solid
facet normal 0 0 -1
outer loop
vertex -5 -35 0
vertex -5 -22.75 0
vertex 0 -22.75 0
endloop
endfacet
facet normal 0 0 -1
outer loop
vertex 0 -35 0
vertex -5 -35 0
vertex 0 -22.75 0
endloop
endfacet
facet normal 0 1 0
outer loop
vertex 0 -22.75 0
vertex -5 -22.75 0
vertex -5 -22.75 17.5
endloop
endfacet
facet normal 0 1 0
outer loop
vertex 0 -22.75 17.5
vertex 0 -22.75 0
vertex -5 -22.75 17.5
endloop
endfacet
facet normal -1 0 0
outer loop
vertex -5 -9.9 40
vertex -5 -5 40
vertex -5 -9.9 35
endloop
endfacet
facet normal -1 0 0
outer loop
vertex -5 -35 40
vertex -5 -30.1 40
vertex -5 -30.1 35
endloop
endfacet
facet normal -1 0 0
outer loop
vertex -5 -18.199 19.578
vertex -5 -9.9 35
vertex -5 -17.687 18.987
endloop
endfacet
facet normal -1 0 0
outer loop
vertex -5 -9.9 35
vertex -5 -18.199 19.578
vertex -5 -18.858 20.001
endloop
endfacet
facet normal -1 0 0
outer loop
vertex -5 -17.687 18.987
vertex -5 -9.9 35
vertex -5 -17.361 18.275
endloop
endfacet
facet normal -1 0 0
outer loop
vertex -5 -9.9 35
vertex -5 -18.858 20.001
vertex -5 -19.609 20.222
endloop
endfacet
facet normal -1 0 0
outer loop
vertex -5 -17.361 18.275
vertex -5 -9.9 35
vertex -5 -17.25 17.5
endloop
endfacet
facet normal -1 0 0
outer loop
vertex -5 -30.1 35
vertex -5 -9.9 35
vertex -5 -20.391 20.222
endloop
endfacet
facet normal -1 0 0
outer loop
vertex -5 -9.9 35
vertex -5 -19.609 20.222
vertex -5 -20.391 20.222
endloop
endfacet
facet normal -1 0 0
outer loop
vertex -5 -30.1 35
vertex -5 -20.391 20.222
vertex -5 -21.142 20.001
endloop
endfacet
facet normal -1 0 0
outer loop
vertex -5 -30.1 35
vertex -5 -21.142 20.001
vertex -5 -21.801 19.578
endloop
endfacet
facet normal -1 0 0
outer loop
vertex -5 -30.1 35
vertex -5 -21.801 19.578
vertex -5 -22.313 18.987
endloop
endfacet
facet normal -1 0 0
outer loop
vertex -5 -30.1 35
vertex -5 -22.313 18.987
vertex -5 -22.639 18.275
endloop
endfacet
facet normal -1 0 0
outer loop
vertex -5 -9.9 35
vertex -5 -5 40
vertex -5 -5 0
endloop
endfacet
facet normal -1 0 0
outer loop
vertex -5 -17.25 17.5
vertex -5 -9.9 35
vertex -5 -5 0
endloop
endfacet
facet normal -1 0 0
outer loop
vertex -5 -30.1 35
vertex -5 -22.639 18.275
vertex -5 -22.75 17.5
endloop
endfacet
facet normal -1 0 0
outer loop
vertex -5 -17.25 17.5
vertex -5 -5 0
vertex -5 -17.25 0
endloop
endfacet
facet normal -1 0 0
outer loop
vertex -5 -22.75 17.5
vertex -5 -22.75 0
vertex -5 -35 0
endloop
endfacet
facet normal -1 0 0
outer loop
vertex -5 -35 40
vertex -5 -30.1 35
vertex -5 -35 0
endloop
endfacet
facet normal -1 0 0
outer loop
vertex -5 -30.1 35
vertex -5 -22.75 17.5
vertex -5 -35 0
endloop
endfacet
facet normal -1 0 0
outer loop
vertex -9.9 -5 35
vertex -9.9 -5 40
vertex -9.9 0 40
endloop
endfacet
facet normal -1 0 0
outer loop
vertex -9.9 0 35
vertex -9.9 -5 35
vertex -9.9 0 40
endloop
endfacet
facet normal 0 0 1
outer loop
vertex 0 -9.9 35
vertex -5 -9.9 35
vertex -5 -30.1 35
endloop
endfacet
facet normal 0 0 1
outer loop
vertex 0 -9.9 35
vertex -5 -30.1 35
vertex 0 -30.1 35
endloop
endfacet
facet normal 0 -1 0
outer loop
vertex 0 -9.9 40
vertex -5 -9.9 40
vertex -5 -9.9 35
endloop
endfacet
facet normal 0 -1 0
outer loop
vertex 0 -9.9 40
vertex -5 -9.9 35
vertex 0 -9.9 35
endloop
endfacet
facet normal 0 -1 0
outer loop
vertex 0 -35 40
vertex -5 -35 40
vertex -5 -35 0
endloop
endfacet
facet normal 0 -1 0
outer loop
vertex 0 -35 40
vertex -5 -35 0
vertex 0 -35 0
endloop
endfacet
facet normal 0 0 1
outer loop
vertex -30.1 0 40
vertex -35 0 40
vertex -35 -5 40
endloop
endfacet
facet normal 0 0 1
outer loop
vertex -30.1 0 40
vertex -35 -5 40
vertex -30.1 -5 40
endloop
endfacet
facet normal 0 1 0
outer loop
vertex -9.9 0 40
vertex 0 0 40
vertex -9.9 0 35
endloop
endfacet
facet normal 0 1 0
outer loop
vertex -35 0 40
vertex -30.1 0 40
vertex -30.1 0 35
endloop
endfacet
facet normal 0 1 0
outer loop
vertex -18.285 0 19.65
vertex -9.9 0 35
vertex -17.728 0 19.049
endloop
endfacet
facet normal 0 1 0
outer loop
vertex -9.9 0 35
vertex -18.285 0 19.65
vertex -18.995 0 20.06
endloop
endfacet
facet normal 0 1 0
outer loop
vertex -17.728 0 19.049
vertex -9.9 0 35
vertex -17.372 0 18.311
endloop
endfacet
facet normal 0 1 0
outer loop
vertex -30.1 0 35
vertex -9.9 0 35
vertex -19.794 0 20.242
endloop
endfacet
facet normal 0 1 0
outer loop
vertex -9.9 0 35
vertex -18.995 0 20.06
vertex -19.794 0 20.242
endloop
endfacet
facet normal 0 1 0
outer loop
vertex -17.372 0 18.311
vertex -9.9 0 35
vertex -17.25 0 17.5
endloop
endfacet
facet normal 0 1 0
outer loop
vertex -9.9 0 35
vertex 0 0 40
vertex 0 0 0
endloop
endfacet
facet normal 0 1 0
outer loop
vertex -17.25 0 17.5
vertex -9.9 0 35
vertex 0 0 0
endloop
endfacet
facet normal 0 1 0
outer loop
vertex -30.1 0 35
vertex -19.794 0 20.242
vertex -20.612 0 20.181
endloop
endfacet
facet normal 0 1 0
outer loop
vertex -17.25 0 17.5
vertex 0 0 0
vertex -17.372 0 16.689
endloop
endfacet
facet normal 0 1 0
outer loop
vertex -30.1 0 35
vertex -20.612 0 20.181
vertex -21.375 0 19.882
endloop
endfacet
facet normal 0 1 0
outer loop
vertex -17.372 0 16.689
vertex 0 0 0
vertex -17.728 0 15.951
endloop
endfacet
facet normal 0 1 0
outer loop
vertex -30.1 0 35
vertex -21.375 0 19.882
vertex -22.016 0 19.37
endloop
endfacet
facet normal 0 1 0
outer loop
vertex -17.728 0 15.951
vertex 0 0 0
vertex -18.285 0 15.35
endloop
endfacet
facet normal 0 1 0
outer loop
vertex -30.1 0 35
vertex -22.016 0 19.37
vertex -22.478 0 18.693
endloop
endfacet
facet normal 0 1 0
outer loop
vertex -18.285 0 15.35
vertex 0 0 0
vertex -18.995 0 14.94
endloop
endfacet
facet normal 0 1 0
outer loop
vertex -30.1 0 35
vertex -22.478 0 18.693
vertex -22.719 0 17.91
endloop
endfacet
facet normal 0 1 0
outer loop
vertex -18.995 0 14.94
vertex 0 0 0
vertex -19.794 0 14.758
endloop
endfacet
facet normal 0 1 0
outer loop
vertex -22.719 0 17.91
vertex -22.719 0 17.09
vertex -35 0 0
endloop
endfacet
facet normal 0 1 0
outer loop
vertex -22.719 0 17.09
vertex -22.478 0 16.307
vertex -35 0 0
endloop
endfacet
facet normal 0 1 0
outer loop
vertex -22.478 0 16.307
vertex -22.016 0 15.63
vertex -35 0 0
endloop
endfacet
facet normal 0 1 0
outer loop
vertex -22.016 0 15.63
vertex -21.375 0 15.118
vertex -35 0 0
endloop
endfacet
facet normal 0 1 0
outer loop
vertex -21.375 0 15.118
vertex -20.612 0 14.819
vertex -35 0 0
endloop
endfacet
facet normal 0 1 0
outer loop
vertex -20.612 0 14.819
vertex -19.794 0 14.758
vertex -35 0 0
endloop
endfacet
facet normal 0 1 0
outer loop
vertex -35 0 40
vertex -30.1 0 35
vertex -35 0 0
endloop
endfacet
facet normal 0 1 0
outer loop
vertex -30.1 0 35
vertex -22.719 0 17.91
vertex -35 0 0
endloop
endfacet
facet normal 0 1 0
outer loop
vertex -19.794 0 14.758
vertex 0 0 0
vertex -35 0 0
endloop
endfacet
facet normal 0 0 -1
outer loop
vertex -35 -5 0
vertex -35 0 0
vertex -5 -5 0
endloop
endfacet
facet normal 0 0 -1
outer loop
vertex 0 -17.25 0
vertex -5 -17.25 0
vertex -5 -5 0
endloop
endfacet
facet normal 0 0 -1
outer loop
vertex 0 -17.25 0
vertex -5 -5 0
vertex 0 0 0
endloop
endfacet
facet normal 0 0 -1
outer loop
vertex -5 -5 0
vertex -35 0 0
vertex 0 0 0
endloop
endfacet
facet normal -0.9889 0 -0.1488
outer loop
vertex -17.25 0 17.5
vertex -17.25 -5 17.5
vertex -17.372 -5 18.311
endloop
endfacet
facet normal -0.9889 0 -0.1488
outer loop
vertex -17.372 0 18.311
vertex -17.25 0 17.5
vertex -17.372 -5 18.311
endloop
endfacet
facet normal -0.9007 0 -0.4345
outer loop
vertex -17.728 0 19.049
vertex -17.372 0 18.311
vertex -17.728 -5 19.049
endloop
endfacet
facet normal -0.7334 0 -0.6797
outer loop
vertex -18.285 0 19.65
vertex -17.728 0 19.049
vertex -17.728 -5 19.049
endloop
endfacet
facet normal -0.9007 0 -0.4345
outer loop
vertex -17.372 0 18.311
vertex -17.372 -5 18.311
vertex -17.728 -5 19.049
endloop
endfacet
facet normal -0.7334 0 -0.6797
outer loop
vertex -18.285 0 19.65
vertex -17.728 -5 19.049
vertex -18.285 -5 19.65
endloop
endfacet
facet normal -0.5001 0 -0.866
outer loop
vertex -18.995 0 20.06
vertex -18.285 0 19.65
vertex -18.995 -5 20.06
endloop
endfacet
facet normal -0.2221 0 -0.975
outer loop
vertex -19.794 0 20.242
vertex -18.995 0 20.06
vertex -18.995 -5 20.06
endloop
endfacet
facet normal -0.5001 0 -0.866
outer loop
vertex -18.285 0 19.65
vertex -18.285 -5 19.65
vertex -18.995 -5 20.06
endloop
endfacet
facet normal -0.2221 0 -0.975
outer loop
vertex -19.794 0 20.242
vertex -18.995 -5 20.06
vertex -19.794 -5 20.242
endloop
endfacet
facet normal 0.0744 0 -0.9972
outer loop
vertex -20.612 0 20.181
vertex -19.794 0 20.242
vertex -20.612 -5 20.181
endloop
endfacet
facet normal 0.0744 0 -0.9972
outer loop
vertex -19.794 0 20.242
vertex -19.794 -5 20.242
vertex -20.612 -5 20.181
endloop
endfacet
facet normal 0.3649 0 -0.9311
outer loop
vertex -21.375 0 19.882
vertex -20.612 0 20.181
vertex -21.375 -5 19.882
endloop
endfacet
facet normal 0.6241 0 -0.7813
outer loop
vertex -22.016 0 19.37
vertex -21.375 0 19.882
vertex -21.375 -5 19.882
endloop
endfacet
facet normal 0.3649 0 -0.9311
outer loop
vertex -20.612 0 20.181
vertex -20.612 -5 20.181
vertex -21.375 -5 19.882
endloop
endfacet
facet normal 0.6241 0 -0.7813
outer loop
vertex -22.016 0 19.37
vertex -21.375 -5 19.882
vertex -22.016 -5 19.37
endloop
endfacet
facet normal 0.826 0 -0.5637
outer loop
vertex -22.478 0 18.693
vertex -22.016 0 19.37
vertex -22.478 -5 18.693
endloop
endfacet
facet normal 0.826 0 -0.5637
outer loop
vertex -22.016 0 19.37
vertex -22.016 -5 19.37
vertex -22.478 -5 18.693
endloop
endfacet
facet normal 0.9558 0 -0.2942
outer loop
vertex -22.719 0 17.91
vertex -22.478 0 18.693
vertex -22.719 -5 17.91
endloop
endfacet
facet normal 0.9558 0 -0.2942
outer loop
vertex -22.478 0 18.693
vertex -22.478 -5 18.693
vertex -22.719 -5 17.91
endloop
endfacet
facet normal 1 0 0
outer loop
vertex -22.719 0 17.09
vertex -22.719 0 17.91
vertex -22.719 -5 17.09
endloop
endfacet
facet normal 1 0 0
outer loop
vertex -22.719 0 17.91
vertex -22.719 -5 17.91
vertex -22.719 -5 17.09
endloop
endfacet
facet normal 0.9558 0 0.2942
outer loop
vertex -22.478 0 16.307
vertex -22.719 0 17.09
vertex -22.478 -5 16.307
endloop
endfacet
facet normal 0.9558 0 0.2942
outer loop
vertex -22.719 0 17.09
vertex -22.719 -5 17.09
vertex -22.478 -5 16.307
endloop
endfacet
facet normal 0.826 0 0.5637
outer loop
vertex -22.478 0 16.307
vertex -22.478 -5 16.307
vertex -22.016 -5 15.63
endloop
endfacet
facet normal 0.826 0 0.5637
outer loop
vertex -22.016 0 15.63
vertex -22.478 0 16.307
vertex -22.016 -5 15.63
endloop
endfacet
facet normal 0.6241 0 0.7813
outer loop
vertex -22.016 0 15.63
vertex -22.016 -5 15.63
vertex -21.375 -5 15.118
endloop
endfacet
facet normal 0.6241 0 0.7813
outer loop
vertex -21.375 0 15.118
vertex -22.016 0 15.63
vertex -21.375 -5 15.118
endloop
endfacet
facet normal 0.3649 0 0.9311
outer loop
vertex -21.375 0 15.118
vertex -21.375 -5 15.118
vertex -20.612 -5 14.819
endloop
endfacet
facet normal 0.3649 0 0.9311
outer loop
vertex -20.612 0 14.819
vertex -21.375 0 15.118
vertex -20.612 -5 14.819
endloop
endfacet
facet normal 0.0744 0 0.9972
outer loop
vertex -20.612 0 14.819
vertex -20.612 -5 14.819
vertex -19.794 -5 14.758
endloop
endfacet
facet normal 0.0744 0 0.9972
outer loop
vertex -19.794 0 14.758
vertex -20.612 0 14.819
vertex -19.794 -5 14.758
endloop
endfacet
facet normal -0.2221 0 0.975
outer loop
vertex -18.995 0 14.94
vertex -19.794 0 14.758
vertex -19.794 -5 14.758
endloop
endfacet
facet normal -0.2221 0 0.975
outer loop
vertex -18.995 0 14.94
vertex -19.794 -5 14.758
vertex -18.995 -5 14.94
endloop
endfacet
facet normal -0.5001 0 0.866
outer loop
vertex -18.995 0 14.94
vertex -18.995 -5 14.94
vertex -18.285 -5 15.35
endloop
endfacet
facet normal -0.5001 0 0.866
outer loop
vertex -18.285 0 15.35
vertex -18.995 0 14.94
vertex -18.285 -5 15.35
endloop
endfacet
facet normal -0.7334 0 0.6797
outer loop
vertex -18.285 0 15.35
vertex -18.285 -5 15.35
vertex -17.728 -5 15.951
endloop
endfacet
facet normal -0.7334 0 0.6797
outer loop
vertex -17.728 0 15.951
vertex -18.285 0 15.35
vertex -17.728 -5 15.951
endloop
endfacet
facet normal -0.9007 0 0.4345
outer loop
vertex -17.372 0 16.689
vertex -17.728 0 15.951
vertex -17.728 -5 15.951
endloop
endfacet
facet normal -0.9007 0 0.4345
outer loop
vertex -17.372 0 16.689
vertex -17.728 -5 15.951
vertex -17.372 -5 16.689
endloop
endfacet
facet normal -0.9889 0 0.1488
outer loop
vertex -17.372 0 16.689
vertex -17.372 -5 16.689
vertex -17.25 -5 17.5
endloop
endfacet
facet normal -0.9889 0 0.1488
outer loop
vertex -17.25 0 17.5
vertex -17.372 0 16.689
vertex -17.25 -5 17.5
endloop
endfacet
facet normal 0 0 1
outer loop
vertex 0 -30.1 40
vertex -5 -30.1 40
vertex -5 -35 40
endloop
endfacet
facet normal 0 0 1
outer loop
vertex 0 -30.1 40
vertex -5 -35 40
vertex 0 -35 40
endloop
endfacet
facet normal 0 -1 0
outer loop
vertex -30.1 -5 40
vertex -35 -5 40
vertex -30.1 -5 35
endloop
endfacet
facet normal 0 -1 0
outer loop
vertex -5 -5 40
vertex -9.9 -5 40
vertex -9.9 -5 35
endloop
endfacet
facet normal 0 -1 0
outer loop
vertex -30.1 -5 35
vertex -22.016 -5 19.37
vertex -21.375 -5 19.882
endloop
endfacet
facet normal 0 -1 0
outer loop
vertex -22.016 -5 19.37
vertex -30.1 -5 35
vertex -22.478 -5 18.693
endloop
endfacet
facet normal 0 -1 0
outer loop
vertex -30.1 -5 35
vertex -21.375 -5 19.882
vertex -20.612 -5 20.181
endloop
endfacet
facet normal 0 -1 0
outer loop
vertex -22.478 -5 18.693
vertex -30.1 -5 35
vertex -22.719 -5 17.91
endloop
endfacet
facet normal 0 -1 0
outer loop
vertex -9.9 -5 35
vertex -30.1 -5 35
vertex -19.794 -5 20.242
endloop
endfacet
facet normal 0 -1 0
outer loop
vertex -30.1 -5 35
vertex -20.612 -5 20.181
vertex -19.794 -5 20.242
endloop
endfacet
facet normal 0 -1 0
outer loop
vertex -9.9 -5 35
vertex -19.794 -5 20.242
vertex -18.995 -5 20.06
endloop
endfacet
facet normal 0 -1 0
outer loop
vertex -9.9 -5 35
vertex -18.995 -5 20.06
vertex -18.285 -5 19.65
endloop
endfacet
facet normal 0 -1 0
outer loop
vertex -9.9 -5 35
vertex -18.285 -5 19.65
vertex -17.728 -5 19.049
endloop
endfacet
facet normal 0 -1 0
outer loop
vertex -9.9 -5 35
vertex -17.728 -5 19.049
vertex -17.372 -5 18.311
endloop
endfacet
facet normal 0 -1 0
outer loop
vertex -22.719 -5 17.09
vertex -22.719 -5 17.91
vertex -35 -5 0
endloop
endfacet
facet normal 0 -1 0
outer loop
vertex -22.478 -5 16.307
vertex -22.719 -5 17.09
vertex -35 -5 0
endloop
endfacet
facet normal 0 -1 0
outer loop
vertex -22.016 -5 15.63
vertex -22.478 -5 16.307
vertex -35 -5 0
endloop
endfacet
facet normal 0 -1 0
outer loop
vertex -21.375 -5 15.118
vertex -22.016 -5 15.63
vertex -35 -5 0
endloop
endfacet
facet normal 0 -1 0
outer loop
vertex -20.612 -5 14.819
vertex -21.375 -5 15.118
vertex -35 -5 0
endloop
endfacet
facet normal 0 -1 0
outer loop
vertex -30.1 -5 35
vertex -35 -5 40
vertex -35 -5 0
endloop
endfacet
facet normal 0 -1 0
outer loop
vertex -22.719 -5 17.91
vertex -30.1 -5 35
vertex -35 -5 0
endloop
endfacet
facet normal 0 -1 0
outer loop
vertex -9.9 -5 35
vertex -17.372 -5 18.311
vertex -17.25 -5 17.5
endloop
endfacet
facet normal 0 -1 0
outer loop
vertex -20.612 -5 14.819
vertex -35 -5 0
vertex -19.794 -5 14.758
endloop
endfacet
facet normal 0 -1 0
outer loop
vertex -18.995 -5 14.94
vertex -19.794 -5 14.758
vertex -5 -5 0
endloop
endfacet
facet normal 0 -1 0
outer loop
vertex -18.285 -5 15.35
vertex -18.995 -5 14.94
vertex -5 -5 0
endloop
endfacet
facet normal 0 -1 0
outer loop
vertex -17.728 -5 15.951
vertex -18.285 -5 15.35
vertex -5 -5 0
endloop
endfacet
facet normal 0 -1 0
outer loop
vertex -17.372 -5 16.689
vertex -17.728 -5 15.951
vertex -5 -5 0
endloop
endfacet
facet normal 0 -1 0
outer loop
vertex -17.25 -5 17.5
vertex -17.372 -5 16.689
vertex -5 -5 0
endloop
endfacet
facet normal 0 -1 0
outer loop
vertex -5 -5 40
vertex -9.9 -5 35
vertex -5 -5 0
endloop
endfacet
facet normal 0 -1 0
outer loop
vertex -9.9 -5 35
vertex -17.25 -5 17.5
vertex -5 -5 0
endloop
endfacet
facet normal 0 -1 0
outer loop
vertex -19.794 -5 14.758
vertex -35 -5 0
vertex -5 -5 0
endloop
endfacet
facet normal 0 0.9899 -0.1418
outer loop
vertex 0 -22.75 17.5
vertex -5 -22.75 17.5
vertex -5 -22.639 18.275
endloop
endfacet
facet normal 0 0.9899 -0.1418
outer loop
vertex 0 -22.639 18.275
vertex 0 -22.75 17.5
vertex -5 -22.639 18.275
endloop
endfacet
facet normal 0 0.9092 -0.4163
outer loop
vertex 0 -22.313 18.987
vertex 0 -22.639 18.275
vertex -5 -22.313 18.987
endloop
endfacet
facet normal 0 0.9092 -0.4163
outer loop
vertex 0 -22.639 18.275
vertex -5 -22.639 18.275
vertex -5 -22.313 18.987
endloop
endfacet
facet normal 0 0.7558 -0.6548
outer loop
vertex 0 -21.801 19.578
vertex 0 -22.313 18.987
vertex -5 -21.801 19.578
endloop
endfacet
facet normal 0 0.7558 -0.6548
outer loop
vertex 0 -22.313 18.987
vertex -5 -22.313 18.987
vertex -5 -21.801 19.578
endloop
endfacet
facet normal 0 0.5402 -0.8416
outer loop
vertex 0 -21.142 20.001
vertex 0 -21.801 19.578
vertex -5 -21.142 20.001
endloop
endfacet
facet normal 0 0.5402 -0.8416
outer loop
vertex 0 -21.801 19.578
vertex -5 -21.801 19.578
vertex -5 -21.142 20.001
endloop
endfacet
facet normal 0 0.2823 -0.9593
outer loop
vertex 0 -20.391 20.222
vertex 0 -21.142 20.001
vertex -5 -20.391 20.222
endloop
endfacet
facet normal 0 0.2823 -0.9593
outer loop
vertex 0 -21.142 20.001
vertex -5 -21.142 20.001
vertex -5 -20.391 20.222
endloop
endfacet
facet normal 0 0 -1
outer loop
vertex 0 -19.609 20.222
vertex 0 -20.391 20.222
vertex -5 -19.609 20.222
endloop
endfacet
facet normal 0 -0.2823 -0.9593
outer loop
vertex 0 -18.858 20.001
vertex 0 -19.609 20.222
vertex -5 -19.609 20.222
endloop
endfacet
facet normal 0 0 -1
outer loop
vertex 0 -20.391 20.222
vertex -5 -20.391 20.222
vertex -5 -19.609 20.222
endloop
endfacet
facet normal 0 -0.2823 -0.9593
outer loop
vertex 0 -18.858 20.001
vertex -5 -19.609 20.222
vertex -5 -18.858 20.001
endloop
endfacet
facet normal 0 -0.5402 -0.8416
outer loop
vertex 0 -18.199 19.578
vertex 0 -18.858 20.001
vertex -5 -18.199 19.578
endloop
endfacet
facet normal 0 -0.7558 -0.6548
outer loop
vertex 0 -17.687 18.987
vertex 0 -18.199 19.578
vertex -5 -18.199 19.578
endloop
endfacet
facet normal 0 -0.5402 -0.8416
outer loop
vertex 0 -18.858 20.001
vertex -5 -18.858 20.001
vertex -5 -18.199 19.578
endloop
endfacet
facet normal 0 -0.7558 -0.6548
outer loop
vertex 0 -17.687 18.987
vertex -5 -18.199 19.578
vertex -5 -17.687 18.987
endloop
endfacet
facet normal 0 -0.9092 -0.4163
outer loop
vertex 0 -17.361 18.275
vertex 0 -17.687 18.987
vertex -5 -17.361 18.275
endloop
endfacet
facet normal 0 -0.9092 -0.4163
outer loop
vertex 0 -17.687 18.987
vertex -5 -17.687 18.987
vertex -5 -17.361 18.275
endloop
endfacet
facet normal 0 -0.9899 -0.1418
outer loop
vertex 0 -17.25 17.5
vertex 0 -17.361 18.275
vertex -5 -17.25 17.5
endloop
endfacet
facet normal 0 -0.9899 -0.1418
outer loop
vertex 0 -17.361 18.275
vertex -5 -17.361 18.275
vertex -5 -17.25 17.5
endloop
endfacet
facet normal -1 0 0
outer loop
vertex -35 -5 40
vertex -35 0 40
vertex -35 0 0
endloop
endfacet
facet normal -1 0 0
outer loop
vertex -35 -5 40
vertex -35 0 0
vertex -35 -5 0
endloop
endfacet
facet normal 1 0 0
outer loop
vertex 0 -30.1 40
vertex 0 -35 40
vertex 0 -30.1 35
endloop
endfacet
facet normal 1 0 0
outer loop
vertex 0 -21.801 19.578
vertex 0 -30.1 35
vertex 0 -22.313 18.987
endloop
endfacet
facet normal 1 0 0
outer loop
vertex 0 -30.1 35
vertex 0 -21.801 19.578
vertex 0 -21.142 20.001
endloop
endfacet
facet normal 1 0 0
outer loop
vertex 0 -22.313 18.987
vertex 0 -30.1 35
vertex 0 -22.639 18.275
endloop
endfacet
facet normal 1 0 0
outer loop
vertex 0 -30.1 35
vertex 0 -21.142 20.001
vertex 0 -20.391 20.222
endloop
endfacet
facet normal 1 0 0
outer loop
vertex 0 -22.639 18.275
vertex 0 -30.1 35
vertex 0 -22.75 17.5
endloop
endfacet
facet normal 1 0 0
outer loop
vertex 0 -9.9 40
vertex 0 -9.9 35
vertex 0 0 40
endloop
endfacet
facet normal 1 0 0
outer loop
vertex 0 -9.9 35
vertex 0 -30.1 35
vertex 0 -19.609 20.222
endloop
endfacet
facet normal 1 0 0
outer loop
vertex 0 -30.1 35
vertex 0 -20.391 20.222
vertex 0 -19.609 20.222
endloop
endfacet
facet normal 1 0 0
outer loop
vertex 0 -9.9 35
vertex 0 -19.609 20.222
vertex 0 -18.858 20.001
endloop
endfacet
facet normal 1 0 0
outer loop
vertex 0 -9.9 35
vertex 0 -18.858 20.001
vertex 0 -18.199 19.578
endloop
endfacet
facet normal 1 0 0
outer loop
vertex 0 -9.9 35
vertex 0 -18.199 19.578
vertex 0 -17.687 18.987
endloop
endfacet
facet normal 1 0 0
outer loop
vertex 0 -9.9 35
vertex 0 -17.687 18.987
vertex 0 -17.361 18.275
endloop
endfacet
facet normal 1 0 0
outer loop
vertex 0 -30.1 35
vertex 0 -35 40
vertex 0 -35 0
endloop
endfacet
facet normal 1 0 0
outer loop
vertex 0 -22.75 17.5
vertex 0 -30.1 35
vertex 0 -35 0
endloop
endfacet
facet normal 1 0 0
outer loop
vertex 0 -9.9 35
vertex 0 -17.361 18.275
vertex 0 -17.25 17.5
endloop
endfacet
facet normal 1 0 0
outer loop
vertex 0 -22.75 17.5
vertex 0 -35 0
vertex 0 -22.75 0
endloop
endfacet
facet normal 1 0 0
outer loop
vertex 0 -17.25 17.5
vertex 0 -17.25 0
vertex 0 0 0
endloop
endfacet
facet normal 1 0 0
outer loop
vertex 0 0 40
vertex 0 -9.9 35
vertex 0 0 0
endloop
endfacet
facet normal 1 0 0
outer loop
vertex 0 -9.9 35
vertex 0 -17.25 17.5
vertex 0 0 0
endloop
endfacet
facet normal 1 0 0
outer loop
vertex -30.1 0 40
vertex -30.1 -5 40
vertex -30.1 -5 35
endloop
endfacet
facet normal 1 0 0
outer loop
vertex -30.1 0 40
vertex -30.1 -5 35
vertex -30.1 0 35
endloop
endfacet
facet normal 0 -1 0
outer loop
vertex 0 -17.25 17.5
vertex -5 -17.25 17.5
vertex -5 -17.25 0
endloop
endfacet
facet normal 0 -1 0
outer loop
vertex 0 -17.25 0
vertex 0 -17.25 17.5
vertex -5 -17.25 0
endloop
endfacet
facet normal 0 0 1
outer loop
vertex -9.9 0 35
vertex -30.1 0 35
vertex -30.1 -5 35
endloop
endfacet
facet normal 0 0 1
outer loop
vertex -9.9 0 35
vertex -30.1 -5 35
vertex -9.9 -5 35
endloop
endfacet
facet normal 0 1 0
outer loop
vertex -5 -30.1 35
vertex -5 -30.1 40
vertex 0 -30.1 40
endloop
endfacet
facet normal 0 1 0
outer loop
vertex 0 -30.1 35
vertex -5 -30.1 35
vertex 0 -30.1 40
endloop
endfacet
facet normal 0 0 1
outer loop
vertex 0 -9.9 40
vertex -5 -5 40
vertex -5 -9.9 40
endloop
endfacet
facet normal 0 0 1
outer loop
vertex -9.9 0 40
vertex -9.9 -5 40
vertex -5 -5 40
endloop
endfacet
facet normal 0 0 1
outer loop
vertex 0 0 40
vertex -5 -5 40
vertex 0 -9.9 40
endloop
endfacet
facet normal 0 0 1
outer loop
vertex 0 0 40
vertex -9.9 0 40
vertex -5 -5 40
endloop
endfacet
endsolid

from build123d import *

# Parameters (mm, degrees)
PAD_DEPTH       = 40
SKETCH001_W     = 20.2
SKETCH001_H     = 5
SKETCH001_W_2   = 5
SKETCH001_H_2   = 20.2
POCKET_DEPTH    = 5
SKETCH002_R     = 2.75
POCKET001_DEPTH = 5.001
POCKET002_DEPTH = 5.001


with BuildPart() as part:
    # Sketch → Pad (new body)
    with BuildSketch(Plane.XY):
        Polygon((0, 0), (-35, 0), (-35, -5), (-5, -5), (-5, -35), (0, -35), align=None)
    extrude(amount=PAD_DEPTH)

    # Sketch001 (on Face8 of Pad) → Pocket (cut)
    with BuildSketch(Plane.XY.offset(40)):
        with Locations((-20, -2.5)):
            Rectangle(SKETCH001_W, SKETCH001_H)
        with Locations((-2.5, -20)):
            Rectangle(SKETCH001_W_2, SKETCH001_H_2)
    extrude(amount=-POCKET_DEPTH, mode=Mode.SUBTRACT)

    # Sketch002 (on Face10 of Pocket) → Pocket001 (cut, through all)
    with BuildSketch(Plane.XZ.offset(5)):
        with Locations((-20, 17.5)):
            Circle(SKETCH002_R)
    extrude(amount=-POCKET001_DEPTH, mode=Mode.SUBTRACT)

    # Sketch003 (on Face12 of Pocket001) → Pocket002 (cut, through all)
    with BuildSketch(Plane(origin=(-5, 0, 0), x_dir=(0, -1, 0), z_dir=(-1, 0, 0))):
        with BuildLine():
            Line((17.25, 0), (22.75, 0))
            Line((22.75, 0), (22.75, 17.5))
            ThreePointArc((22.75, 17.5), (20, 20.25), (17.25, 17.5))
            Line((17.25, 17.5), (17.25, 0))
        make_face()
    extrude(amount=-POCKET002_DEPTH, mode=Mode.SUBTRACT)


solid = part.part
